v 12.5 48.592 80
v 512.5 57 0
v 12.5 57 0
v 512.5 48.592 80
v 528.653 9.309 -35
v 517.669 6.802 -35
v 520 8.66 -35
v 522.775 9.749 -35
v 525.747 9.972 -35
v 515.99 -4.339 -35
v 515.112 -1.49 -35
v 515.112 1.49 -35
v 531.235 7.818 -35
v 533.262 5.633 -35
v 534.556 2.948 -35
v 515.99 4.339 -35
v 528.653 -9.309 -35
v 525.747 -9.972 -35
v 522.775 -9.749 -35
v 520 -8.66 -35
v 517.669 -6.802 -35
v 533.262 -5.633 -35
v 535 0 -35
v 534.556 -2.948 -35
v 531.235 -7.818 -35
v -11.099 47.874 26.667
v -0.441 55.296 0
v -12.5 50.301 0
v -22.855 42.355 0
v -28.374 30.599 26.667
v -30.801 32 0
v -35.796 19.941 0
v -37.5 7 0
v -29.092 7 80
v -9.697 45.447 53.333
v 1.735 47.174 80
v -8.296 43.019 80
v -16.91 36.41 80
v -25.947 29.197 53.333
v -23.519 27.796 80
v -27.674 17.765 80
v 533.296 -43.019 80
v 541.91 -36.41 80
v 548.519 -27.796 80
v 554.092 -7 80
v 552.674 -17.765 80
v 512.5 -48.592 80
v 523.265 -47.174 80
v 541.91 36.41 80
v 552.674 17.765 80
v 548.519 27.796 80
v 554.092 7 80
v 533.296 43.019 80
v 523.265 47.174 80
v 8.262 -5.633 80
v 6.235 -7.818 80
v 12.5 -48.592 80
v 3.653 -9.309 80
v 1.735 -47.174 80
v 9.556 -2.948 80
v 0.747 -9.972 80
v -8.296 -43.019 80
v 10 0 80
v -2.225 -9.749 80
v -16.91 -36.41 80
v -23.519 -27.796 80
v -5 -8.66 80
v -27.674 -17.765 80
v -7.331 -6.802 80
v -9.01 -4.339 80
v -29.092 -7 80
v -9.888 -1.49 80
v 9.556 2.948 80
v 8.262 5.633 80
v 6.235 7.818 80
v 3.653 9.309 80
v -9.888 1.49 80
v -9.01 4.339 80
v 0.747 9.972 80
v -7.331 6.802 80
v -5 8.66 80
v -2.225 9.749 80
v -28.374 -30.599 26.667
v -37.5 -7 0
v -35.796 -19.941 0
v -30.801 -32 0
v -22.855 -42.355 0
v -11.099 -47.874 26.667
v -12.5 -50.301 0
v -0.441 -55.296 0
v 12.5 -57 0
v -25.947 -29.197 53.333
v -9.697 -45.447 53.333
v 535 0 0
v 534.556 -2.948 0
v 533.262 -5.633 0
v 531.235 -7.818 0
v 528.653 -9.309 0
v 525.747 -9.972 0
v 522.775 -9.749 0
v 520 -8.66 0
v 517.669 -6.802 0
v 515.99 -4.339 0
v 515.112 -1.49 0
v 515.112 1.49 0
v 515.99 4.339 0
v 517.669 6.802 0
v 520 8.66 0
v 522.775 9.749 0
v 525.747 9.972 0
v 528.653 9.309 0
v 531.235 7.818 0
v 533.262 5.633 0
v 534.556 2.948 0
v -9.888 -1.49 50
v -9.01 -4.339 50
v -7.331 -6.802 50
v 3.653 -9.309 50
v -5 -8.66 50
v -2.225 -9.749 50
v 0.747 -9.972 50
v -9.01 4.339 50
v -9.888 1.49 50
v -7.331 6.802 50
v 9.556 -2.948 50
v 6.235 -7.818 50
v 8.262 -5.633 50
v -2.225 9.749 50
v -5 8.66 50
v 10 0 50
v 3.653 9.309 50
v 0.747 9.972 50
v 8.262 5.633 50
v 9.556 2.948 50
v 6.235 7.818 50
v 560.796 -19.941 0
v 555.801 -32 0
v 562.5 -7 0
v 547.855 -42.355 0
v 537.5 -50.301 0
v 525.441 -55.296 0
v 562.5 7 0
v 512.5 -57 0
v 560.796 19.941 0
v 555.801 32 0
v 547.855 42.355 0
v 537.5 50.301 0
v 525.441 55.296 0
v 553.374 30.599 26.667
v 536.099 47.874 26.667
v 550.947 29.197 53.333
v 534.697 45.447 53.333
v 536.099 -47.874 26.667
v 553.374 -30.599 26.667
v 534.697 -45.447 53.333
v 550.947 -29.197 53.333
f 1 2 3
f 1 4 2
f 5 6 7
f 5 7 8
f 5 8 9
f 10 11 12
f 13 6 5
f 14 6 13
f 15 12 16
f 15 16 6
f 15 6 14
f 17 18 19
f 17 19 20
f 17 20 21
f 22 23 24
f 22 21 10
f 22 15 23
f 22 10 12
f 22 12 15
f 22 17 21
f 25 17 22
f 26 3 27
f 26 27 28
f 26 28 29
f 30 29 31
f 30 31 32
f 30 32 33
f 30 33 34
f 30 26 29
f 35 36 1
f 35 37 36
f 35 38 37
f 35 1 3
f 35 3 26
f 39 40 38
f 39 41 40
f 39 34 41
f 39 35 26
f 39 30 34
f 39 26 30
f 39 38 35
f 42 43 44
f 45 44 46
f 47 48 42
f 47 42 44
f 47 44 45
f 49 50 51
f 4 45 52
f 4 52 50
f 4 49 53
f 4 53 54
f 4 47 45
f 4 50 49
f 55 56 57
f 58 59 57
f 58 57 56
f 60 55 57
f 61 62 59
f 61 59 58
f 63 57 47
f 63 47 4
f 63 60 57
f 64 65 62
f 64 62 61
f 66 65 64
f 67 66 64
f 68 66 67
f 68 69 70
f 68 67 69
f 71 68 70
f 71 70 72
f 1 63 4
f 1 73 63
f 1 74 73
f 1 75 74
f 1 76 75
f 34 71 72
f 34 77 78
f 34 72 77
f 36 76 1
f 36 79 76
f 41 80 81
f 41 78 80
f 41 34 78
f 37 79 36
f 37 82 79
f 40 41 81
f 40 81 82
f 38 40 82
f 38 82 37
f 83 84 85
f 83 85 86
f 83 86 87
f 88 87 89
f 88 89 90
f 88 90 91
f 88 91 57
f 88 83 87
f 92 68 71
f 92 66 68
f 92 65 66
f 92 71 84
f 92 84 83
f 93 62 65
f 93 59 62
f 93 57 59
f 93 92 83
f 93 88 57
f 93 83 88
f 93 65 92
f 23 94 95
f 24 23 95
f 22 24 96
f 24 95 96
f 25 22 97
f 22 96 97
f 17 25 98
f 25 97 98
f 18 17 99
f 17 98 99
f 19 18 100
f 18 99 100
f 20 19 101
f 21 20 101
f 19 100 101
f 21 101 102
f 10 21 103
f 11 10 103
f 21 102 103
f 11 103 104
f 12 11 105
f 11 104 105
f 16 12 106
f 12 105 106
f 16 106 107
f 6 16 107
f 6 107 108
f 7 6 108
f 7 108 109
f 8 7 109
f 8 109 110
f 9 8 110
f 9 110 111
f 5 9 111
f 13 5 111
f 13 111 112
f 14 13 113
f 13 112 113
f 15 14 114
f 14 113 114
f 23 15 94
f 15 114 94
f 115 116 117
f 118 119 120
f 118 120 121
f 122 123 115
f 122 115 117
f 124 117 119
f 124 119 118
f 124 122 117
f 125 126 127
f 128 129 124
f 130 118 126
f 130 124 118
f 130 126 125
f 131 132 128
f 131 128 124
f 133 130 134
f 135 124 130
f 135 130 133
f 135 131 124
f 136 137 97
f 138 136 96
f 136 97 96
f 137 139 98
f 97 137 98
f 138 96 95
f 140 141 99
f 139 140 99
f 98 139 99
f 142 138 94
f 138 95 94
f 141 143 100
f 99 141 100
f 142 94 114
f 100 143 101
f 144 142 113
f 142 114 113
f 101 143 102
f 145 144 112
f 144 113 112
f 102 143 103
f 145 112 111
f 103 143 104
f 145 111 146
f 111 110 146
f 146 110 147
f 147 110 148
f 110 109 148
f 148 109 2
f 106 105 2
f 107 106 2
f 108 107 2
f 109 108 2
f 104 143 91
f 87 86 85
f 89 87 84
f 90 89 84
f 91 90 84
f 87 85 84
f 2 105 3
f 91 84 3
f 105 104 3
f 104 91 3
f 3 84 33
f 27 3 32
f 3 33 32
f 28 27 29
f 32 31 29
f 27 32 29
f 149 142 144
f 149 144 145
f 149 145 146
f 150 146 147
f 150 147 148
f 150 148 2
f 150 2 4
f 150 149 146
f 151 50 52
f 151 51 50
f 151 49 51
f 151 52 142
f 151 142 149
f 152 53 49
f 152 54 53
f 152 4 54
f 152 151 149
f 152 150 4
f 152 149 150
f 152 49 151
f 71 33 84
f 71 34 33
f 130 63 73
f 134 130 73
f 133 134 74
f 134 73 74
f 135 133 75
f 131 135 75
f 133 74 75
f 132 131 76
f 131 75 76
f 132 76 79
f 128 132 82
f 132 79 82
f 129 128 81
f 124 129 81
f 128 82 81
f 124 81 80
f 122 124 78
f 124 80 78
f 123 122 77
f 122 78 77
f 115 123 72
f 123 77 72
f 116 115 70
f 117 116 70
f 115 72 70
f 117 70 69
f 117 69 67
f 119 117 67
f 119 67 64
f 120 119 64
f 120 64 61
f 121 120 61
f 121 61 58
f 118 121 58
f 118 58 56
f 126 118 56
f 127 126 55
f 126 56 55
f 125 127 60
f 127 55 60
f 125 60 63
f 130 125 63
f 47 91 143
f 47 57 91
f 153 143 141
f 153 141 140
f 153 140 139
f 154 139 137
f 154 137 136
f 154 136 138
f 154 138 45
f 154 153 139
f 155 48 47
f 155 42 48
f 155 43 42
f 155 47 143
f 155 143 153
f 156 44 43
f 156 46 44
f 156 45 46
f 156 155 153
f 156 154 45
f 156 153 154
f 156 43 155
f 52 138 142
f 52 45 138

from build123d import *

# Parameters (mm, degrees)
BOSS_EXTRUDE1_DEPTH   = 80
BOSS_EXTRUDE1_TAPER   = 6
SKETCH2_R             = 10
BOSS_EXTRUDE2_DEPTH   = 35
SKETCH3_R             = 10
CUT_EXTRUDE1_DEPTH    = 30
BODY_MOVE_COPY2_ANGLE = 90


with BuildPart() as part:
    # Sketch1 → Boss-Extrude1 (new body)
    with BuildSketch(Plane(origin=(0, 0, 0), x_dir=(1, 0, 0), z_dir=(0, 1, 0))):
        with BuildLine():
            ThreePointArc((-250, 57), (-285.355339059, 42.355339059), (-300, 7))
            Line((-300, 7), (-300, -7))
            ThreePointArc((-300, -7), (-285.355339059, -42.355339059), (-250, -57))
            Line((-250, -57), (250, -57))
            ThreePointArc((250, -57), (285.355339059, -42.355339059), (300, -7))
            Line((300, -7), (300, 7))
            ThreePointArc((300, 7), (285.355339059, 42.355339059), (250, 57))
            Line((250, 57), (-250, 57))
        make_face()
    extrude(amount=BOSS_EXTRUDE1_DEPTH, taper=BOSS_EXTRUDE1_TAPER)

    # Sketch2 → Boss-Extrude2 (add)
    with BuildSketch(Plane.XZ):
        with Locations((262.5, 0)):
            Circle(SKETCH2_R)
    extrude(amount=BOSS_EXTRUDE2_DEPTH)

    # Sketch3 → Cut-Extrude1 (cut)
    with BuildSketch(Plane(origin=(0, 80, 0), x_dir=(1, 0, 0), z_dir=(0, 1, 0))):
        with Locations((-262.5, 0)):
            Circle(SKETCH3_R)
    extrude(amount=-CUT_EXTRUDE1_DEPTH, mode=Mode.SUBTRACT)


with BuildPart() as part_1:
    # Body-Move/Copy1: moved
    add(part.part.moved(Location((262.5, 0, 0))))


with BuildPart() as part_2:
    # Body-Move/Copy2: moved
    add(part_1.part.rotate(Axis((0, 0, 0), (1, 0, 0)), BODY_MOVE_COPY2_ANGLE))


solid = part_2.part
